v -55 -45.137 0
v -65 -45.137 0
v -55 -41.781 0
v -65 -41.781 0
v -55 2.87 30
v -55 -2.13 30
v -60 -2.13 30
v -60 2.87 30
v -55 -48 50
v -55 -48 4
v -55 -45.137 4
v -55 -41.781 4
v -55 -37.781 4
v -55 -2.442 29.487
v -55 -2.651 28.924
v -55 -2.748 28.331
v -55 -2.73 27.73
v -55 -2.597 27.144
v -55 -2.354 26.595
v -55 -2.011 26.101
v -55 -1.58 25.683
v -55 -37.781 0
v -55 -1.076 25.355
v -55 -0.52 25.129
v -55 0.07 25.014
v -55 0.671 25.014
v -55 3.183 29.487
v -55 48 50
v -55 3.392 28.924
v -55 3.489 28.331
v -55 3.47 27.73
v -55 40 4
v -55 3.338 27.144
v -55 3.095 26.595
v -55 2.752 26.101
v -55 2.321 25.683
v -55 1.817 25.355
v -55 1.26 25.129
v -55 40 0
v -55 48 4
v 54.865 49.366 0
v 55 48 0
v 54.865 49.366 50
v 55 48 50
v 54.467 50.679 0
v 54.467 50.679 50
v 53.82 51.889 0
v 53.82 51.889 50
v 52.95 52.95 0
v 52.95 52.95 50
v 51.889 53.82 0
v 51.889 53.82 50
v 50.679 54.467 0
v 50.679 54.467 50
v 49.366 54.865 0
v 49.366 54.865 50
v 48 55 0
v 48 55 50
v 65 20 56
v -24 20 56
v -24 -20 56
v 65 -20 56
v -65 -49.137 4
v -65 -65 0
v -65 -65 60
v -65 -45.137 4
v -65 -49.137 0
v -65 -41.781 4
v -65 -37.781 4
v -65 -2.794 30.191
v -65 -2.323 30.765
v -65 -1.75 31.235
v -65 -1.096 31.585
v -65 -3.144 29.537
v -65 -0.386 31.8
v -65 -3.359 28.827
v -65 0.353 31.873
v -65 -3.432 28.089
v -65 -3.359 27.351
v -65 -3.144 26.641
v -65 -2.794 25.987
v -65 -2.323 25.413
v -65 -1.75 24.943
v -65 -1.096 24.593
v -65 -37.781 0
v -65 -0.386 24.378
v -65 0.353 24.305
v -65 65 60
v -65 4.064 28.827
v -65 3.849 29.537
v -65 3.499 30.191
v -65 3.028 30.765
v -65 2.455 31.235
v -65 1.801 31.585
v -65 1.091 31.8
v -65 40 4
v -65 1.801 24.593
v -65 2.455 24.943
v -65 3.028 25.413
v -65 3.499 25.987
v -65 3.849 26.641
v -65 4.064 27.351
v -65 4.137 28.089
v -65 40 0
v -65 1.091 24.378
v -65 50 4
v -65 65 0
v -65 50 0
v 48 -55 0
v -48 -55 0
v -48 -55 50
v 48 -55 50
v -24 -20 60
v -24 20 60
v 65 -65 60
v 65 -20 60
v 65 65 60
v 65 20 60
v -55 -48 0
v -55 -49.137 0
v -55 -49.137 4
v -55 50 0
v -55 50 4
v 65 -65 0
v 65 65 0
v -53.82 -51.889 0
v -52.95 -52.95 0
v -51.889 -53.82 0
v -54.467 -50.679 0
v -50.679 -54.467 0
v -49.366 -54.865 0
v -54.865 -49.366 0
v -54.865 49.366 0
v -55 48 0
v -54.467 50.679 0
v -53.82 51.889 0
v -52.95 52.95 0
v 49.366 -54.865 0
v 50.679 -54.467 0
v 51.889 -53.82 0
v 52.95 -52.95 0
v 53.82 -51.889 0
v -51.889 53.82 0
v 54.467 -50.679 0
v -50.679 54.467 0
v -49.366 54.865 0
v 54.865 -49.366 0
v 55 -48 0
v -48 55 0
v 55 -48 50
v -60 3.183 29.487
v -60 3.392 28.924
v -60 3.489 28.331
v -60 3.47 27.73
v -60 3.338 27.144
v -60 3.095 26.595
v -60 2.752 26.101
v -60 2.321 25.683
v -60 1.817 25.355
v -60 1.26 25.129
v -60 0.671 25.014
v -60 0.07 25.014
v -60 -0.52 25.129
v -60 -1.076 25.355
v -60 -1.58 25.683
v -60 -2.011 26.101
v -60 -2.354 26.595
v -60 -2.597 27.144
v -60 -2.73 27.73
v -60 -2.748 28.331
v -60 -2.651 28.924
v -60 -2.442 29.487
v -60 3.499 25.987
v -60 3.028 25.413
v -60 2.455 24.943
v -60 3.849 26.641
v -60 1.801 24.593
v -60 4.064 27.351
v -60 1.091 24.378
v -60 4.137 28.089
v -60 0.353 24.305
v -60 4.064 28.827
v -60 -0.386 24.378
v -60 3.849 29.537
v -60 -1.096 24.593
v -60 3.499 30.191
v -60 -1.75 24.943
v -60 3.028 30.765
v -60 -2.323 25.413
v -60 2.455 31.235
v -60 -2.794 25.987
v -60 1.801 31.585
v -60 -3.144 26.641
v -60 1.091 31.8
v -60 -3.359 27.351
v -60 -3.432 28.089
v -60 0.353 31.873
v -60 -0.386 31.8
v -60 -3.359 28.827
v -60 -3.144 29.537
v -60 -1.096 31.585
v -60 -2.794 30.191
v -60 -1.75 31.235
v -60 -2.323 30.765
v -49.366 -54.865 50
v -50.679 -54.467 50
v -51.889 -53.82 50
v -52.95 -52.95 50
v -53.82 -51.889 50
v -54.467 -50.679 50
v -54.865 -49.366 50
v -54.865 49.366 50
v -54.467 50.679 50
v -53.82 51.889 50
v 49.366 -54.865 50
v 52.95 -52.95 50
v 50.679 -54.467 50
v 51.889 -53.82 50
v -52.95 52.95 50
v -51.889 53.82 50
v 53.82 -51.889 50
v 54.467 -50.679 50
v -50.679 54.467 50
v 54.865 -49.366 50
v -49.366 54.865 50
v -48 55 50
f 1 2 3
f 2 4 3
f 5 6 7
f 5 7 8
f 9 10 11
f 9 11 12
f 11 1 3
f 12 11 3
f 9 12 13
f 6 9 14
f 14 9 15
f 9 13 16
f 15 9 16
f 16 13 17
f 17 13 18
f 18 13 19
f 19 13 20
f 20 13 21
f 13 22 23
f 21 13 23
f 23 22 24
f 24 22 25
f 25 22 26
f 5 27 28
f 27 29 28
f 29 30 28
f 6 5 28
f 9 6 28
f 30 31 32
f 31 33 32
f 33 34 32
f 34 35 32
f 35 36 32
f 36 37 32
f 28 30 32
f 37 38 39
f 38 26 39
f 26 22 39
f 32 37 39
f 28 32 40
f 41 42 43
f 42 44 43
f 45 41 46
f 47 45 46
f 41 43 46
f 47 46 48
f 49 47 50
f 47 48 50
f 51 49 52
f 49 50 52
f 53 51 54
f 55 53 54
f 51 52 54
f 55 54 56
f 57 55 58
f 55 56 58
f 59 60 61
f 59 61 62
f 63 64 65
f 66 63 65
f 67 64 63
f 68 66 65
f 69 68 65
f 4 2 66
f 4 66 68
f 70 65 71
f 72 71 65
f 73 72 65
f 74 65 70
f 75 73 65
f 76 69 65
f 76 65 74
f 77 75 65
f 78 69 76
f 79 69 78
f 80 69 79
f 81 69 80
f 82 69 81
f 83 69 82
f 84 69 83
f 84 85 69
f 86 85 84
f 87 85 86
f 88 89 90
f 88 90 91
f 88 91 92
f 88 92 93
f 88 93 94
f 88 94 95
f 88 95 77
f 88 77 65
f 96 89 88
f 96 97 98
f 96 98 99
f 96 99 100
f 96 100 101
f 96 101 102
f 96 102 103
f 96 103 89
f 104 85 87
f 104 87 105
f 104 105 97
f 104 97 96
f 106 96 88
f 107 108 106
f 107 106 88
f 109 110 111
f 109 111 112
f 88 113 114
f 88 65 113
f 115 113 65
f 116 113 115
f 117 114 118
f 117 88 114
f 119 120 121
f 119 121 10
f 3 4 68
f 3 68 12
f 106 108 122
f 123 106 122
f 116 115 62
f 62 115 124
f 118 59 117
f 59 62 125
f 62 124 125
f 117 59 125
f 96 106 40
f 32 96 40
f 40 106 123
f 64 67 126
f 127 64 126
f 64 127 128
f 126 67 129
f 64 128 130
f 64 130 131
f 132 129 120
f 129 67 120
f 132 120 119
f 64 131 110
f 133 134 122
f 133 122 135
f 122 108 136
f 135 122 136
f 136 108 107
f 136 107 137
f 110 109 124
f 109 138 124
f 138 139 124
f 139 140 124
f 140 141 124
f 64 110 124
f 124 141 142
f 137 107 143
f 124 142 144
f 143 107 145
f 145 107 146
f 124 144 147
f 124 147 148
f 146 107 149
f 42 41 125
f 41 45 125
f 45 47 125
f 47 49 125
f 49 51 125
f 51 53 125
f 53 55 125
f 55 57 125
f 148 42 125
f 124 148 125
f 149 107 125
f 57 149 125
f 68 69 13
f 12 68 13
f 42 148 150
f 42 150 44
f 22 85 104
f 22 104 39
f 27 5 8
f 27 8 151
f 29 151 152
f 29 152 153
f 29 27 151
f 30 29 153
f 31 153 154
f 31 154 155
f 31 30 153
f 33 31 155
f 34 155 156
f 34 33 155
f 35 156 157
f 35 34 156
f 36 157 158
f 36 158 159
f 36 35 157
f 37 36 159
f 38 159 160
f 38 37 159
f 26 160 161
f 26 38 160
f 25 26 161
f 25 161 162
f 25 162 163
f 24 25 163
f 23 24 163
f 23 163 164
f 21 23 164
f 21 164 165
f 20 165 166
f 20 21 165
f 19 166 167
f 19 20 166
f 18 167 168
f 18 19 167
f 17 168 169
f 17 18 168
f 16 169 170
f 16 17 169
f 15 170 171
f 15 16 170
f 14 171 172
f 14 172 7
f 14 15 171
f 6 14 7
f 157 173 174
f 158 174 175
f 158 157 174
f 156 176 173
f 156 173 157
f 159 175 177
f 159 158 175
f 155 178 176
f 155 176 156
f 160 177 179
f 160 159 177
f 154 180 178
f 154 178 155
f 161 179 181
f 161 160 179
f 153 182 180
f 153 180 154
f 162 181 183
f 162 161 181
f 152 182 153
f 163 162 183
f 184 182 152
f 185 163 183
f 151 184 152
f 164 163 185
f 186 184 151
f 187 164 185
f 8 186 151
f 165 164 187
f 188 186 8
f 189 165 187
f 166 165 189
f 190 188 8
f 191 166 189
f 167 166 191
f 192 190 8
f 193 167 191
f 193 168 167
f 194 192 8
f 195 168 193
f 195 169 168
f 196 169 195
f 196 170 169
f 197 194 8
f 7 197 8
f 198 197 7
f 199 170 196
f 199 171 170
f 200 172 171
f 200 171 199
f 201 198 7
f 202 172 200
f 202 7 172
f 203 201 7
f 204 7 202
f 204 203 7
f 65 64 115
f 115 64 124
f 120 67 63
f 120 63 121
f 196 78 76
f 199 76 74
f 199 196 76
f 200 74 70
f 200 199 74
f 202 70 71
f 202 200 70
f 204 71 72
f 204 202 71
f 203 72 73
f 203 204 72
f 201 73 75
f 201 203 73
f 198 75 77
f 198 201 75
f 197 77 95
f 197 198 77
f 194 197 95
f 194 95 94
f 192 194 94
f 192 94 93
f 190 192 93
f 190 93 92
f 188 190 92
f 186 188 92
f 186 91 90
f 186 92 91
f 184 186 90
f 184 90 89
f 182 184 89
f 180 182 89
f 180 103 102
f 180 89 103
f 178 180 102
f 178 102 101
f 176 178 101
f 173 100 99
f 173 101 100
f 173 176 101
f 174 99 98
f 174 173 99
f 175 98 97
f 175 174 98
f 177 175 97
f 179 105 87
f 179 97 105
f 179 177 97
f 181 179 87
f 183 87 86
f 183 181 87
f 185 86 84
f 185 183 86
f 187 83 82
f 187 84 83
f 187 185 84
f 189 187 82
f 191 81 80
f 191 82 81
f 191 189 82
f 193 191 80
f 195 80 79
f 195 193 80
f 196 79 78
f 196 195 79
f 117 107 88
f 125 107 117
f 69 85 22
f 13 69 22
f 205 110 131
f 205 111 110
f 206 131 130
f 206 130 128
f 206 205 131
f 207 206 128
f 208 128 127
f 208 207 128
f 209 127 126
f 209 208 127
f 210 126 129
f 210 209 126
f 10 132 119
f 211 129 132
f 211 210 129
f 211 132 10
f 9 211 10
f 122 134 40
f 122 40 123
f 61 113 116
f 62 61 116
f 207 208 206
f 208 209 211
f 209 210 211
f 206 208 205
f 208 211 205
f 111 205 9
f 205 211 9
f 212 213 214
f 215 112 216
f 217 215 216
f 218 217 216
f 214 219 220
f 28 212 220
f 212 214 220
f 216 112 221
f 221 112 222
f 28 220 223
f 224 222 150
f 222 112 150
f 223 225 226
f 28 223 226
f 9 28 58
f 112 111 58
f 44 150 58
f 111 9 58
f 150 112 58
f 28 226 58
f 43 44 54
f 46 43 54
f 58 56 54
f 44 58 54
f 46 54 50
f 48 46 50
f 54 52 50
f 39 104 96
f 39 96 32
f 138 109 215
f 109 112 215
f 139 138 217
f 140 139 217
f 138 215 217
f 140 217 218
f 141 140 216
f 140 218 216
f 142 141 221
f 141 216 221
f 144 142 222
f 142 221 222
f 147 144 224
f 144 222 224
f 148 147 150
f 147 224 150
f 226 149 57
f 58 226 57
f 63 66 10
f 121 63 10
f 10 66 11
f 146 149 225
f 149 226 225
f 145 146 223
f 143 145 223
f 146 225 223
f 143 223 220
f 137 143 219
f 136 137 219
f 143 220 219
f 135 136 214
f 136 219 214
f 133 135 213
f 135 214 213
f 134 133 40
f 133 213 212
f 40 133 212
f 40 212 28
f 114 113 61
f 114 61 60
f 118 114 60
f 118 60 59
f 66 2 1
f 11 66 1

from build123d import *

# Parameters (mm, degrees)
F0_W      = 130
F0_H      = 130
F1_DEPTH  = 60
F2_W      = 110
F2_H      = 110
F3_DEPTH  = 50
F4_W      = 89
F4_H      = 40
F5_DEPTH  = 4
F6_R      = 7
F7_W      = 10
F7_H      = 4
F8_DEPTH  = 4
F9_W      = 10
F9_H      = 4
F10_DEPTH = 4
F11_W     = 10
F11_H     = 10
F12_DEPTH = 4
F15_DEPTH = 5
F17_R     = 3.7840755507
F18_DEPTH = 10


with BuildPart() as f1:
    # F0 (on Top) → F1 (new body)
    with BuildSketch(Plane.XY):
        Rectangle(F0_W, F0_H)
    extrude(amount=F1_DEPTH)

    # F2 (on Top) → F3 (cut)
    with BuildSketch(Plane.XY):
        Rectangle(F2_W, F2_H)
    extrude(amount=F3_DEPTH, mode=Mode.SUBTRACT)

    # F4 (on face) → F5 (cut)
    with BuildSketch(Plane.XY.offset(60)):
        with Locations((20.5, 0)):
            Rectangle(F4_W, F4_H)
    extrude(amount=-F5_DEPTH, mode=Mode.SUBTRACT)

    # F6
    f6_edges = [f1.edges().sort_by_distance(p)[0] for p in [
        (55, -55, 25),
        (55, 55, 25),
        (-55, 55, 25),
        (-55, -55, 25),
    ]]
    fillet(f6_edges, radius=F6_R)

    # F7 (on face) → F8 (cut)
    with BuildSketch(Plane.XY):
        with Locations((-60, -39.7807884514)):
            Rectangle(F7_W, F7_H)
    extrude(amount=F8_DEPTH, mode=Mode.SUBTRACT)

    # F9 (on face) → F10 (cut)
    with BuildSketch(Plane.XY):
        with Locations((-60, -47.1367839277)):
            Rectangle(F9_W, F9_H)
    extrude(amount=F10_DEPTH, mode=Mode.SUBTRACT)

    # F11 (on face) → F12 (cut)
    with BuildSketch(Plane.XY):
        with Locations((-60, 45)):
            Rectangle(F11_W, F11_H)
    extrude(amount=F12_DEPTH, mode=Mode.SUBTRACT)

    # F14 (on offset) → F15 (cut)
    with BuildSketch(Plane(origin=(-55, 0, 0), x_dir=(0, -1, 0), z_dir=(-1, 0, 0))):
        with BuildLine():
            ThreePointArc((-2.8704081755, 30), (-0.3704081755, 25), (2.1295918245, 30))
            Line((2.1295918245, 30), (-2.8704081755, 30))
        make_face()
    extrude(amount=F15_DEPTH, mode=Mode.SUBTRACT)

    # F17 (on offset) → F18 (cut)
    with BuildSketch(Plane(origin=(-60, 0, 0), x_dir=(0, -1, 0), z_dir=(-1, 0, 0))):
        with Locations((-0.3525029916, 28.0889305786)):
            Circle(F17_R)
    extrude(amount=F18_DEPTH, mode=Mode.SUBTRACT)


solid = f1.part
